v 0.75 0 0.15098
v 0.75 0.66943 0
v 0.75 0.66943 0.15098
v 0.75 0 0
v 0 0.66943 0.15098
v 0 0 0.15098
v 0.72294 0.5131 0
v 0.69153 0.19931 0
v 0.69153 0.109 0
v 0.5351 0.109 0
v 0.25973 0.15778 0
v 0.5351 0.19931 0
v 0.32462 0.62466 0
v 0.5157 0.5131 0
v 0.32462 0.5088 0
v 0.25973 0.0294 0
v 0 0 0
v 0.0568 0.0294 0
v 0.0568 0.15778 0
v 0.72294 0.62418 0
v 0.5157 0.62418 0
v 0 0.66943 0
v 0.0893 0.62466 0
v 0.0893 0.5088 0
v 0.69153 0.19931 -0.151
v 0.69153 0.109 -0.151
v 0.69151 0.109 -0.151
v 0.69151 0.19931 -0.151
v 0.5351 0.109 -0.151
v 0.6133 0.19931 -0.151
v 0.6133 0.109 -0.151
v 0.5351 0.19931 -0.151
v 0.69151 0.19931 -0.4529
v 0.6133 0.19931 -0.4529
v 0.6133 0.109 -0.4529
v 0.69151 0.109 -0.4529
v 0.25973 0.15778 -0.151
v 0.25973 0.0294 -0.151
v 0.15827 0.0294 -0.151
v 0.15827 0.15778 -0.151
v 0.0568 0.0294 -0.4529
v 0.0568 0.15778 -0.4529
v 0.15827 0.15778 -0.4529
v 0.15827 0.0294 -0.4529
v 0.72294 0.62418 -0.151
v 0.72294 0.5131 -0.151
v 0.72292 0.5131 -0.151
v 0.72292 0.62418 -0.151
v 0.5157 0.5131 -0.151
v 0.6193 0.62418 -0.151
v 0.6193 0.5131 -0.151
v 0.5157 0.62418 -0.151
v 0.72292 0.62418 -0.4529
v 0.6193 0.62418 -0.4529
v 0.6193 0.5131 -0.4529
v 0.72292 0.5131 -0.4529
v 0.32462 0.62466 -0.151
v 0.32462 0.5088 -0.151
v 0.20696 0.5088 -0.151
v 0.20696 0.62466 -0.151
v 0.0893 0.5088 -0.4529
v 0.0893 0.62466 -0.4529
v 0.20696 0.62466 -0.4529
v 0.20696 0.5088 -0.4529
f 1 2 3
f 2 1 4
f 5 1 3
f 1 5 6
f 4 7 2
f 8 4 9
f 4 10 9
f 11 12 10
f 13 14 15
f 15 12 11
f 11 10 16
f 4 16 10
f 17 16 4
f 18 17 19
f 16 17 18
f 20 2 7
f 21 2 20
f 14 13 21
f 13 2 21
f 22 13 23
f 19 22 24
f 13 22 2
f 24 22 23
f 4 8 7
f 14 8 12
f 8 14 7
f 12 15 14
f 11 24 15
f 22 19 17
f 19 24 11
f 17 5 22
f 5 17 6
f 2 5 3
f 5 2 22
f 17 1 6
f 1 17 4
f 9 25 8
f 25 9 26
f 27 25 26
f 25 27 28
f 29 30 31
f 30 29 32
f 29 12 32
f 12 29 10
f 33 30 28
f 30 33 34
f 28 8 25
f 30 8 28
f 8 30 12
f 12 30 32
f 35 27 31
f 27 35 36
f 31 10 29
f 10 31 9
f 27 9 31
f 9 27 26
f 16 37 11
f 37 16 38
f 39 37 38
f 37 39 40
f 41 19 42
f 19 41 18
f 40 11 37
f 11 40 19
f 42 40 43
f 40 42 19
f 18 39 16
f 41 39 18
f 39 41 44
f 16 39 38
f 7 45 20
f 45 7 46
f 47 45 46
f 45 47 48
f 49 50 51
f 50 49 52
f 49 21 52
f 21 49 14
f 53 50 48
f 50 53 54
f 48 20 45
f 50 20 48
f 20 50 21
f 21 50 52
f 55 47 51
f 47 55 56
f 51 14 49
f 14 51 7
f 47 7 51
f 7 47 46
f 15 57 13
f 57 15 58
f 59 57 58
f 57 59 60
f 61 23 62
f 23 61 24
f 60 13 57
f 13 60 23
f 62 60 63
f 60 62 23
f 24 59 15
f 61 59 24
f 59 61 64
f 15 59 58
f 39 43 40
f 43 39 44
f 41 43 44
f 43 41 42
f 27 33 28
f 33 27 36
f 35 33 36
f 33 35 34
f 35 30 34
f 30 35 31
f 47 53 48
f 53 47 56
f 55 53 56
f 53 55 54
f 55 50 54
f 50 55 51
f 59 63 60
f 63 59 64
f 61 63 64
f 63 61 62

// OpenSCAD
// OpenSCAD Parametric Model
$fn = 64;

// Base Dimensions
base_length = 0.75;
base_width  = 0.669426;
base_height = 0.150979;

// Feature Depths
shallow_depth = 0.151;
deep_depth    = 0.302;
deep_start_z  = -0.1509; // Offset below base underside (Z=0)

// Shallow Pad Parameters: [x_size, y_size, left_offset, front_offset]
s1 = [0.156427, 0.090313, 0.5351, 0.109];
s2 = [0.202932, 0.128382, 0.0568, 0.0294];
s3 = [0.207237, 0.111076, 0.5157, 0.5131];
s4 = [0.235324, 0.115862, 0.0893, 0.5088];

// Deep Continuation Parameters: [x_size, y_size, left_offset, front_offset]
d1 = [0.101466, 0.128382, 0.0568, 0.0294]; // Below s2
d2 = [0.078214, 0.090313, 0.6133, 0.109];   // Below s1
d3 = [0.103619, 0.111076, 0.6193, 0.5131];  // Below s3
d4 = [0.117662, 0.115862, 0.0893, 0.5088];  // Below s4

// Reusable Pad Module
module rect_pad(x, y, h, z_top, lx, fy) {
    translate([lx, fy, z_top - h])
        cube([x, y, h]);
}

// Main Assembly
union() {
    // Solid rectangular base
    cube([base_length, base_width, base_height]);

    // Shallow pads (extend from Z=0 to Z=-0.151)
    rect_pad(s1[0], s1[1], shallow_depth, 0, s1[2], s1[3]);
    rect_pad(s2[0], s2[1], shallow_depth, 0, s2[2], s2[3]);
    rect_pad(s3[0], s3[1], shallow_depth, 0, s3[2], s3[3]);
    rect_pad(s4[0], s4[1], shallow_depth, 0, s4[2], s4[3]);

    // Deep continuations (extend from Z=-0.1509 to Z=-0.4529)
    rect_pad(d1[0], d1[1], deep_depth, deep_start_z, d1[2], d1[3]);
    rect_pad(d2[0], d2[1], deep_depth, deep_start_z, d2[2], d2[3]);
    rect_pad(d3[0], d3[1], deep_depth, deep_start_z, d3[2], d3[3]);
    rect_pad(d4[0], d4[1], deep_depth, deep_start_z, d4[2], d4[3]);
}
